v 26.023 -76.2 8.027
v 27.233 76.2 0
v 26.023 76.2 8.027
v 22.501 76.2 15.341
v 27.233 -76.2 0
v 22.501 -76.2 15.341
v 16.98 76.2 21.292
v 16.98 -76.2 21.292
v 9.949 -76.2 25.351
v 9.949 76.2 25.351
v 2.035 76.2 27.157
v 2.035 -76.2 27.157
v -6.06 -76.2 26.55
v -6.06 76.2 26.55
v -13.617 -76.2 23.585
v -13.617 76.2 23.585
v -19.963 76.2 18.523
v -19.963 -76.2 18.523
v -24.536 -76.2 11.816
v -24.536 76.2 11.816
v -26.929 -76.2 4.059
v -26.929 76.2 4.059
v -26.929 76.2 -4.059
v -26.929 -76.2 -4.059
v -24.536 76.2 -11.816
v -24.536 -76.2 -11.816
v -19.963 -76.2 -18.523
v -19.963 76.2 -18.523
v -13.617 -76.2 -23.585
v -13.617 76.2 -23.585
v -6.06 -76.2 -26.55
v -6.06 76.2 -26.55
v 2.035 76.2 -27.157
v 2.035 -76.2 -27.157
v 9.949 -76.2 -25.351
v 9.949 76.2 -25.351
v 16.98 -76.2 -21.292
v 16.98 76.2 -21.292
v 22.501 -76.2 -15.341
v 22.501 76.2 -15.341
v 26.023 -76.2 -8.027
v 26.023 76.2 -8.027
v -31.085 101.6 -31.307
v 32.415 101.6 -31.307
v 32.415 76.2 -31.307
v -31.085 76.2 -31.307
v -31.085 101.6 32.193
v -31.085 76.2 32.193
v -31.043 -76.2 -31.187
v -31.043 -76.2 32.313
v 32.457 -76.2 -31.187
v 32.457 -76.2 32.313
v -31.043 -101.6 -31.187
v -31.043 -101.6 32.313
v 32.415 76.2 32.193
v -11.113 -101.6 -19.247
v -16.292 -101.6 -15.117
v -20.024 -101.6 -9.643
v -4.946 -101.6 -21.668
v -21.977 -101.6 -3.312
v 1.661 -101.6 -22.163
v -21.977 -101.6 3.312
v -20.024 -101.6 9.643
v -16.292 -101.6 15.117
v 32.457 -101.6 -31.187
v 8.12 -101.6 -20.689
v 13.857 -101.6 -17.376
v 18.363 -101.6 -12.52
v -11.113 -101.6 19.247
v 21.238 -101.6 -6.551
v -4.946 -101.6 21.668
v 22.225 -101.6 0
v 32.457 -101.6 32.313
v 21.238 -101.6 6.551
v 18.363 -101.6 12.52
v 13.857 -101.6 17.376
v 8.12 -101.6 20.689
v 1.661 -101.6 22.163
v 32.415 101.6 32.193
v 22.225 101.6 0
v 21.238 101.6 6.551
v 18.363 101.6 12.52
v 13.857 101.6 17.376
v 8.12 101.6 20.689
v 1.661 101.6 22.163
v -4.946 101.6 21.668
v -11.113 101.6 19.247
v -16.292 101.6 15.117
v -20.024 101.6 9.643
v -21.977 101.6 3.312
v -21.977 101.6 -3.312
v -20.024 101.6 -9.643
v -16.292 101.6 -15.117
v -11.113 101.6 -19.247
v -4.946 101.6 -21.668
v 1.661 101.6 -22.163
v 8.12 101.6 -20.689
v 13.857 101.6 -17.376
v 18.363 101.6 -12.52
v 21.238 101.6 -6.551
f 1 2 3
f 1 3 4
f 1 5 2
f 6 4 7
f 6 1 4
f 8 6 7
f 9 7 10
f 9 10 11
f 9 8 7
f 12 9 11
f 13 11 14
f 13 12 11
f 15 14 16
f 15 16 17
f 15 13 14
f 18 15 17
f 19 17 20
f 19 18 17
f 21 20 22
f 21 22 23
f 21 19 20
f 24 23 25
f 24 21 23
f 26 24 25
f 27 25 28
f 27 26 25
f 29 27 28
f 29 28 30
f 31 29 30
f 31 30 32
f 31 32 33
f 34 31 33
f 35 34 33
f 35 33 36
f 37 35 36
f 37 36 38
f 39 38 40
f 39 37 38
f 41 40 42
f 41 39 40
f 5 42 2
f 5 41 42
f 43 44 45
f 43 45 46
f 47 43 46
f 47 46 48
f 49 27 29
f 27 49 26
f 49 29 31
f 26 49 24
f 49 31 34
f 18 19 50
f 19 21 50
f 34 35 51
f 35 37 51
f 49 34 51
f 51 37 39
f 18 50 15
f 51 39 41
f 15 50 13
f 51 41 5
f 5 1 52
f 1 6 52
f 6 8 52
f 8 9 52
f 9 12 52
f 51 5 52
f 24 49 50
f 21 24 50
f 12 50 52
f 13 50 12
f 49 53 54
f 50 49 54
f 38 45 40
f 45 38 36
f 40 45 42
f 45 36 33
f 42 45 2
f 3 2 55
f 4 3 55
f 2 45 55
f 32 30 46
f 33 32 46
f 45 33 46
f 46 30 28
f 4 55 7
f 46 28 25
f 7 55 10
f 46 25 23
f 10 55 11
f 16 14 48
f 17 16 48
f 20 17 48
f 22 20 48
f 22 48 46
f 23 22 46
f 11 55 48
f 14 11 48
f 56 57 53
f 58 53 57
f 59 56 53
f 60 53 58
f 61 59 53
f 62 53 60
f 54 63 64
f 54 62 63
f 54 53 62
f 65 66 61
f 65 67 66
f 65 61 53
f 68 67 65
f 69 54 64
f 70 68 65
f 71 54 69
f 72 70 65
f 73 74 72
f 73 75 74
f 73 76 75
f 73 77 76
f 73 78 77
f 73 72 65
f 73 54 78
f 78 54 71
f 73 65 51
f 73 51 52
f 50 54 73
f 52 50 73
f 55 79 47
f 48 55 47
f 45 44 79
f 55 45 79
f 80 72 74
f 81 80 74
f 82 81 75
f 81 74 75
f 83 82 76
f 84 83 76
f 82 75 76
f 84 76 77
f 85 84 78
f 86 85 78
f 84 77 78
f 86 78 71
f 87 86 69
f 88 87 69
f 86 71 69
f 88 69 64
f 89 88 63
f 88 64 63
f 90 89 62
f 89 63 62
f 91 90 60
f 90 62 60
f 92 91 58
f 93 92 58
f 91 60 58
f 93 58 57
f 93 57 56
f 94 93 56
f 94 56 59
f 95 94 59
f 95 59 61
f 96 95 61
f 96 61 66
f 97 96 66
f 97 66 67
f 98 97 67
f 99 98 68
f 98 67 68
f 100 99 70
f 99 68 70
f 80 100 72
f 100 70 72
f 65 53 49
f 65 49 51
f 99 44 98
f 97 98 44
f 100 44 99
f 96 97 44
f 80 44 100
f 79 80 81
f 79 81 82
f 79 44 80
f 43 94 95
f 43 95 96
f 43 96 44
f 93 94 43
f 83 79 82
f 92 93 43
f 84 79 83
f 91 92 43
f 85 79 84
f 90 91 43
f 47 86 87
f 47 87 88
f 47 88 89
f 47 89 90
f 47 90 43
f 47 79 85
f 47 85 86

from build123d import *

# Parameters (mm, degrees)
F0_R          = 27.233083
F1_DEPTH      = 101.6
F1_DEPTH_BACK = 101.6
F2_W          = 63.5
F2_H          = 63.5
F2_R          = 27.233083
F3_DEPTH      = 25.4
F5_W          = 63.5
F5_H          = 63.5
F6_DEPTH      = 25.4
F4_R          = 22.225
F7_DEPTH      = 203.2


with BuildPart() as f1:
    # F0 (on Front) → F1 (new body, two sides)
    with BuildSketch(Plane.XZ) as f1_sk:
        Circle(F0_R)
    extrude(amount=F1_DEPTH)
    extrude(f1_sk.sketch, amount=-F1_DEPTH_BACK)

    # F2 (on face) → F3 (join)
    with BuildSketch(Plane.XZ.offset(101.6)):
        with Locations((0.706917, 0.563083)):
            Rectangle(F2_W, F2_H)
        Circle(F2_R, mode=Mode.SUBTRACT)
    extrude(amount=-F3_DEPTH)

    # F5 (on face) → F6 (join)
    with BuildSketch(Plane(origin=(0, 101.6, 0), x_dir=(-1, 0, 0), z_dir=(0, 1, 0))):
        with Locations((-0.664903, 0.443074)):
            Rectangle(F5_W, F5_H)
    extrude(amount=-F6_DEPTH)

    # F4 (on face) → F7 (cut)
    with BuildSketch(Plane.XZ.offset(101.6)):
        Circle(F4_R)
    extrude(amount=-F7_DEPTH, mode=Mode.SUBTRACT)


solid = f1.part
